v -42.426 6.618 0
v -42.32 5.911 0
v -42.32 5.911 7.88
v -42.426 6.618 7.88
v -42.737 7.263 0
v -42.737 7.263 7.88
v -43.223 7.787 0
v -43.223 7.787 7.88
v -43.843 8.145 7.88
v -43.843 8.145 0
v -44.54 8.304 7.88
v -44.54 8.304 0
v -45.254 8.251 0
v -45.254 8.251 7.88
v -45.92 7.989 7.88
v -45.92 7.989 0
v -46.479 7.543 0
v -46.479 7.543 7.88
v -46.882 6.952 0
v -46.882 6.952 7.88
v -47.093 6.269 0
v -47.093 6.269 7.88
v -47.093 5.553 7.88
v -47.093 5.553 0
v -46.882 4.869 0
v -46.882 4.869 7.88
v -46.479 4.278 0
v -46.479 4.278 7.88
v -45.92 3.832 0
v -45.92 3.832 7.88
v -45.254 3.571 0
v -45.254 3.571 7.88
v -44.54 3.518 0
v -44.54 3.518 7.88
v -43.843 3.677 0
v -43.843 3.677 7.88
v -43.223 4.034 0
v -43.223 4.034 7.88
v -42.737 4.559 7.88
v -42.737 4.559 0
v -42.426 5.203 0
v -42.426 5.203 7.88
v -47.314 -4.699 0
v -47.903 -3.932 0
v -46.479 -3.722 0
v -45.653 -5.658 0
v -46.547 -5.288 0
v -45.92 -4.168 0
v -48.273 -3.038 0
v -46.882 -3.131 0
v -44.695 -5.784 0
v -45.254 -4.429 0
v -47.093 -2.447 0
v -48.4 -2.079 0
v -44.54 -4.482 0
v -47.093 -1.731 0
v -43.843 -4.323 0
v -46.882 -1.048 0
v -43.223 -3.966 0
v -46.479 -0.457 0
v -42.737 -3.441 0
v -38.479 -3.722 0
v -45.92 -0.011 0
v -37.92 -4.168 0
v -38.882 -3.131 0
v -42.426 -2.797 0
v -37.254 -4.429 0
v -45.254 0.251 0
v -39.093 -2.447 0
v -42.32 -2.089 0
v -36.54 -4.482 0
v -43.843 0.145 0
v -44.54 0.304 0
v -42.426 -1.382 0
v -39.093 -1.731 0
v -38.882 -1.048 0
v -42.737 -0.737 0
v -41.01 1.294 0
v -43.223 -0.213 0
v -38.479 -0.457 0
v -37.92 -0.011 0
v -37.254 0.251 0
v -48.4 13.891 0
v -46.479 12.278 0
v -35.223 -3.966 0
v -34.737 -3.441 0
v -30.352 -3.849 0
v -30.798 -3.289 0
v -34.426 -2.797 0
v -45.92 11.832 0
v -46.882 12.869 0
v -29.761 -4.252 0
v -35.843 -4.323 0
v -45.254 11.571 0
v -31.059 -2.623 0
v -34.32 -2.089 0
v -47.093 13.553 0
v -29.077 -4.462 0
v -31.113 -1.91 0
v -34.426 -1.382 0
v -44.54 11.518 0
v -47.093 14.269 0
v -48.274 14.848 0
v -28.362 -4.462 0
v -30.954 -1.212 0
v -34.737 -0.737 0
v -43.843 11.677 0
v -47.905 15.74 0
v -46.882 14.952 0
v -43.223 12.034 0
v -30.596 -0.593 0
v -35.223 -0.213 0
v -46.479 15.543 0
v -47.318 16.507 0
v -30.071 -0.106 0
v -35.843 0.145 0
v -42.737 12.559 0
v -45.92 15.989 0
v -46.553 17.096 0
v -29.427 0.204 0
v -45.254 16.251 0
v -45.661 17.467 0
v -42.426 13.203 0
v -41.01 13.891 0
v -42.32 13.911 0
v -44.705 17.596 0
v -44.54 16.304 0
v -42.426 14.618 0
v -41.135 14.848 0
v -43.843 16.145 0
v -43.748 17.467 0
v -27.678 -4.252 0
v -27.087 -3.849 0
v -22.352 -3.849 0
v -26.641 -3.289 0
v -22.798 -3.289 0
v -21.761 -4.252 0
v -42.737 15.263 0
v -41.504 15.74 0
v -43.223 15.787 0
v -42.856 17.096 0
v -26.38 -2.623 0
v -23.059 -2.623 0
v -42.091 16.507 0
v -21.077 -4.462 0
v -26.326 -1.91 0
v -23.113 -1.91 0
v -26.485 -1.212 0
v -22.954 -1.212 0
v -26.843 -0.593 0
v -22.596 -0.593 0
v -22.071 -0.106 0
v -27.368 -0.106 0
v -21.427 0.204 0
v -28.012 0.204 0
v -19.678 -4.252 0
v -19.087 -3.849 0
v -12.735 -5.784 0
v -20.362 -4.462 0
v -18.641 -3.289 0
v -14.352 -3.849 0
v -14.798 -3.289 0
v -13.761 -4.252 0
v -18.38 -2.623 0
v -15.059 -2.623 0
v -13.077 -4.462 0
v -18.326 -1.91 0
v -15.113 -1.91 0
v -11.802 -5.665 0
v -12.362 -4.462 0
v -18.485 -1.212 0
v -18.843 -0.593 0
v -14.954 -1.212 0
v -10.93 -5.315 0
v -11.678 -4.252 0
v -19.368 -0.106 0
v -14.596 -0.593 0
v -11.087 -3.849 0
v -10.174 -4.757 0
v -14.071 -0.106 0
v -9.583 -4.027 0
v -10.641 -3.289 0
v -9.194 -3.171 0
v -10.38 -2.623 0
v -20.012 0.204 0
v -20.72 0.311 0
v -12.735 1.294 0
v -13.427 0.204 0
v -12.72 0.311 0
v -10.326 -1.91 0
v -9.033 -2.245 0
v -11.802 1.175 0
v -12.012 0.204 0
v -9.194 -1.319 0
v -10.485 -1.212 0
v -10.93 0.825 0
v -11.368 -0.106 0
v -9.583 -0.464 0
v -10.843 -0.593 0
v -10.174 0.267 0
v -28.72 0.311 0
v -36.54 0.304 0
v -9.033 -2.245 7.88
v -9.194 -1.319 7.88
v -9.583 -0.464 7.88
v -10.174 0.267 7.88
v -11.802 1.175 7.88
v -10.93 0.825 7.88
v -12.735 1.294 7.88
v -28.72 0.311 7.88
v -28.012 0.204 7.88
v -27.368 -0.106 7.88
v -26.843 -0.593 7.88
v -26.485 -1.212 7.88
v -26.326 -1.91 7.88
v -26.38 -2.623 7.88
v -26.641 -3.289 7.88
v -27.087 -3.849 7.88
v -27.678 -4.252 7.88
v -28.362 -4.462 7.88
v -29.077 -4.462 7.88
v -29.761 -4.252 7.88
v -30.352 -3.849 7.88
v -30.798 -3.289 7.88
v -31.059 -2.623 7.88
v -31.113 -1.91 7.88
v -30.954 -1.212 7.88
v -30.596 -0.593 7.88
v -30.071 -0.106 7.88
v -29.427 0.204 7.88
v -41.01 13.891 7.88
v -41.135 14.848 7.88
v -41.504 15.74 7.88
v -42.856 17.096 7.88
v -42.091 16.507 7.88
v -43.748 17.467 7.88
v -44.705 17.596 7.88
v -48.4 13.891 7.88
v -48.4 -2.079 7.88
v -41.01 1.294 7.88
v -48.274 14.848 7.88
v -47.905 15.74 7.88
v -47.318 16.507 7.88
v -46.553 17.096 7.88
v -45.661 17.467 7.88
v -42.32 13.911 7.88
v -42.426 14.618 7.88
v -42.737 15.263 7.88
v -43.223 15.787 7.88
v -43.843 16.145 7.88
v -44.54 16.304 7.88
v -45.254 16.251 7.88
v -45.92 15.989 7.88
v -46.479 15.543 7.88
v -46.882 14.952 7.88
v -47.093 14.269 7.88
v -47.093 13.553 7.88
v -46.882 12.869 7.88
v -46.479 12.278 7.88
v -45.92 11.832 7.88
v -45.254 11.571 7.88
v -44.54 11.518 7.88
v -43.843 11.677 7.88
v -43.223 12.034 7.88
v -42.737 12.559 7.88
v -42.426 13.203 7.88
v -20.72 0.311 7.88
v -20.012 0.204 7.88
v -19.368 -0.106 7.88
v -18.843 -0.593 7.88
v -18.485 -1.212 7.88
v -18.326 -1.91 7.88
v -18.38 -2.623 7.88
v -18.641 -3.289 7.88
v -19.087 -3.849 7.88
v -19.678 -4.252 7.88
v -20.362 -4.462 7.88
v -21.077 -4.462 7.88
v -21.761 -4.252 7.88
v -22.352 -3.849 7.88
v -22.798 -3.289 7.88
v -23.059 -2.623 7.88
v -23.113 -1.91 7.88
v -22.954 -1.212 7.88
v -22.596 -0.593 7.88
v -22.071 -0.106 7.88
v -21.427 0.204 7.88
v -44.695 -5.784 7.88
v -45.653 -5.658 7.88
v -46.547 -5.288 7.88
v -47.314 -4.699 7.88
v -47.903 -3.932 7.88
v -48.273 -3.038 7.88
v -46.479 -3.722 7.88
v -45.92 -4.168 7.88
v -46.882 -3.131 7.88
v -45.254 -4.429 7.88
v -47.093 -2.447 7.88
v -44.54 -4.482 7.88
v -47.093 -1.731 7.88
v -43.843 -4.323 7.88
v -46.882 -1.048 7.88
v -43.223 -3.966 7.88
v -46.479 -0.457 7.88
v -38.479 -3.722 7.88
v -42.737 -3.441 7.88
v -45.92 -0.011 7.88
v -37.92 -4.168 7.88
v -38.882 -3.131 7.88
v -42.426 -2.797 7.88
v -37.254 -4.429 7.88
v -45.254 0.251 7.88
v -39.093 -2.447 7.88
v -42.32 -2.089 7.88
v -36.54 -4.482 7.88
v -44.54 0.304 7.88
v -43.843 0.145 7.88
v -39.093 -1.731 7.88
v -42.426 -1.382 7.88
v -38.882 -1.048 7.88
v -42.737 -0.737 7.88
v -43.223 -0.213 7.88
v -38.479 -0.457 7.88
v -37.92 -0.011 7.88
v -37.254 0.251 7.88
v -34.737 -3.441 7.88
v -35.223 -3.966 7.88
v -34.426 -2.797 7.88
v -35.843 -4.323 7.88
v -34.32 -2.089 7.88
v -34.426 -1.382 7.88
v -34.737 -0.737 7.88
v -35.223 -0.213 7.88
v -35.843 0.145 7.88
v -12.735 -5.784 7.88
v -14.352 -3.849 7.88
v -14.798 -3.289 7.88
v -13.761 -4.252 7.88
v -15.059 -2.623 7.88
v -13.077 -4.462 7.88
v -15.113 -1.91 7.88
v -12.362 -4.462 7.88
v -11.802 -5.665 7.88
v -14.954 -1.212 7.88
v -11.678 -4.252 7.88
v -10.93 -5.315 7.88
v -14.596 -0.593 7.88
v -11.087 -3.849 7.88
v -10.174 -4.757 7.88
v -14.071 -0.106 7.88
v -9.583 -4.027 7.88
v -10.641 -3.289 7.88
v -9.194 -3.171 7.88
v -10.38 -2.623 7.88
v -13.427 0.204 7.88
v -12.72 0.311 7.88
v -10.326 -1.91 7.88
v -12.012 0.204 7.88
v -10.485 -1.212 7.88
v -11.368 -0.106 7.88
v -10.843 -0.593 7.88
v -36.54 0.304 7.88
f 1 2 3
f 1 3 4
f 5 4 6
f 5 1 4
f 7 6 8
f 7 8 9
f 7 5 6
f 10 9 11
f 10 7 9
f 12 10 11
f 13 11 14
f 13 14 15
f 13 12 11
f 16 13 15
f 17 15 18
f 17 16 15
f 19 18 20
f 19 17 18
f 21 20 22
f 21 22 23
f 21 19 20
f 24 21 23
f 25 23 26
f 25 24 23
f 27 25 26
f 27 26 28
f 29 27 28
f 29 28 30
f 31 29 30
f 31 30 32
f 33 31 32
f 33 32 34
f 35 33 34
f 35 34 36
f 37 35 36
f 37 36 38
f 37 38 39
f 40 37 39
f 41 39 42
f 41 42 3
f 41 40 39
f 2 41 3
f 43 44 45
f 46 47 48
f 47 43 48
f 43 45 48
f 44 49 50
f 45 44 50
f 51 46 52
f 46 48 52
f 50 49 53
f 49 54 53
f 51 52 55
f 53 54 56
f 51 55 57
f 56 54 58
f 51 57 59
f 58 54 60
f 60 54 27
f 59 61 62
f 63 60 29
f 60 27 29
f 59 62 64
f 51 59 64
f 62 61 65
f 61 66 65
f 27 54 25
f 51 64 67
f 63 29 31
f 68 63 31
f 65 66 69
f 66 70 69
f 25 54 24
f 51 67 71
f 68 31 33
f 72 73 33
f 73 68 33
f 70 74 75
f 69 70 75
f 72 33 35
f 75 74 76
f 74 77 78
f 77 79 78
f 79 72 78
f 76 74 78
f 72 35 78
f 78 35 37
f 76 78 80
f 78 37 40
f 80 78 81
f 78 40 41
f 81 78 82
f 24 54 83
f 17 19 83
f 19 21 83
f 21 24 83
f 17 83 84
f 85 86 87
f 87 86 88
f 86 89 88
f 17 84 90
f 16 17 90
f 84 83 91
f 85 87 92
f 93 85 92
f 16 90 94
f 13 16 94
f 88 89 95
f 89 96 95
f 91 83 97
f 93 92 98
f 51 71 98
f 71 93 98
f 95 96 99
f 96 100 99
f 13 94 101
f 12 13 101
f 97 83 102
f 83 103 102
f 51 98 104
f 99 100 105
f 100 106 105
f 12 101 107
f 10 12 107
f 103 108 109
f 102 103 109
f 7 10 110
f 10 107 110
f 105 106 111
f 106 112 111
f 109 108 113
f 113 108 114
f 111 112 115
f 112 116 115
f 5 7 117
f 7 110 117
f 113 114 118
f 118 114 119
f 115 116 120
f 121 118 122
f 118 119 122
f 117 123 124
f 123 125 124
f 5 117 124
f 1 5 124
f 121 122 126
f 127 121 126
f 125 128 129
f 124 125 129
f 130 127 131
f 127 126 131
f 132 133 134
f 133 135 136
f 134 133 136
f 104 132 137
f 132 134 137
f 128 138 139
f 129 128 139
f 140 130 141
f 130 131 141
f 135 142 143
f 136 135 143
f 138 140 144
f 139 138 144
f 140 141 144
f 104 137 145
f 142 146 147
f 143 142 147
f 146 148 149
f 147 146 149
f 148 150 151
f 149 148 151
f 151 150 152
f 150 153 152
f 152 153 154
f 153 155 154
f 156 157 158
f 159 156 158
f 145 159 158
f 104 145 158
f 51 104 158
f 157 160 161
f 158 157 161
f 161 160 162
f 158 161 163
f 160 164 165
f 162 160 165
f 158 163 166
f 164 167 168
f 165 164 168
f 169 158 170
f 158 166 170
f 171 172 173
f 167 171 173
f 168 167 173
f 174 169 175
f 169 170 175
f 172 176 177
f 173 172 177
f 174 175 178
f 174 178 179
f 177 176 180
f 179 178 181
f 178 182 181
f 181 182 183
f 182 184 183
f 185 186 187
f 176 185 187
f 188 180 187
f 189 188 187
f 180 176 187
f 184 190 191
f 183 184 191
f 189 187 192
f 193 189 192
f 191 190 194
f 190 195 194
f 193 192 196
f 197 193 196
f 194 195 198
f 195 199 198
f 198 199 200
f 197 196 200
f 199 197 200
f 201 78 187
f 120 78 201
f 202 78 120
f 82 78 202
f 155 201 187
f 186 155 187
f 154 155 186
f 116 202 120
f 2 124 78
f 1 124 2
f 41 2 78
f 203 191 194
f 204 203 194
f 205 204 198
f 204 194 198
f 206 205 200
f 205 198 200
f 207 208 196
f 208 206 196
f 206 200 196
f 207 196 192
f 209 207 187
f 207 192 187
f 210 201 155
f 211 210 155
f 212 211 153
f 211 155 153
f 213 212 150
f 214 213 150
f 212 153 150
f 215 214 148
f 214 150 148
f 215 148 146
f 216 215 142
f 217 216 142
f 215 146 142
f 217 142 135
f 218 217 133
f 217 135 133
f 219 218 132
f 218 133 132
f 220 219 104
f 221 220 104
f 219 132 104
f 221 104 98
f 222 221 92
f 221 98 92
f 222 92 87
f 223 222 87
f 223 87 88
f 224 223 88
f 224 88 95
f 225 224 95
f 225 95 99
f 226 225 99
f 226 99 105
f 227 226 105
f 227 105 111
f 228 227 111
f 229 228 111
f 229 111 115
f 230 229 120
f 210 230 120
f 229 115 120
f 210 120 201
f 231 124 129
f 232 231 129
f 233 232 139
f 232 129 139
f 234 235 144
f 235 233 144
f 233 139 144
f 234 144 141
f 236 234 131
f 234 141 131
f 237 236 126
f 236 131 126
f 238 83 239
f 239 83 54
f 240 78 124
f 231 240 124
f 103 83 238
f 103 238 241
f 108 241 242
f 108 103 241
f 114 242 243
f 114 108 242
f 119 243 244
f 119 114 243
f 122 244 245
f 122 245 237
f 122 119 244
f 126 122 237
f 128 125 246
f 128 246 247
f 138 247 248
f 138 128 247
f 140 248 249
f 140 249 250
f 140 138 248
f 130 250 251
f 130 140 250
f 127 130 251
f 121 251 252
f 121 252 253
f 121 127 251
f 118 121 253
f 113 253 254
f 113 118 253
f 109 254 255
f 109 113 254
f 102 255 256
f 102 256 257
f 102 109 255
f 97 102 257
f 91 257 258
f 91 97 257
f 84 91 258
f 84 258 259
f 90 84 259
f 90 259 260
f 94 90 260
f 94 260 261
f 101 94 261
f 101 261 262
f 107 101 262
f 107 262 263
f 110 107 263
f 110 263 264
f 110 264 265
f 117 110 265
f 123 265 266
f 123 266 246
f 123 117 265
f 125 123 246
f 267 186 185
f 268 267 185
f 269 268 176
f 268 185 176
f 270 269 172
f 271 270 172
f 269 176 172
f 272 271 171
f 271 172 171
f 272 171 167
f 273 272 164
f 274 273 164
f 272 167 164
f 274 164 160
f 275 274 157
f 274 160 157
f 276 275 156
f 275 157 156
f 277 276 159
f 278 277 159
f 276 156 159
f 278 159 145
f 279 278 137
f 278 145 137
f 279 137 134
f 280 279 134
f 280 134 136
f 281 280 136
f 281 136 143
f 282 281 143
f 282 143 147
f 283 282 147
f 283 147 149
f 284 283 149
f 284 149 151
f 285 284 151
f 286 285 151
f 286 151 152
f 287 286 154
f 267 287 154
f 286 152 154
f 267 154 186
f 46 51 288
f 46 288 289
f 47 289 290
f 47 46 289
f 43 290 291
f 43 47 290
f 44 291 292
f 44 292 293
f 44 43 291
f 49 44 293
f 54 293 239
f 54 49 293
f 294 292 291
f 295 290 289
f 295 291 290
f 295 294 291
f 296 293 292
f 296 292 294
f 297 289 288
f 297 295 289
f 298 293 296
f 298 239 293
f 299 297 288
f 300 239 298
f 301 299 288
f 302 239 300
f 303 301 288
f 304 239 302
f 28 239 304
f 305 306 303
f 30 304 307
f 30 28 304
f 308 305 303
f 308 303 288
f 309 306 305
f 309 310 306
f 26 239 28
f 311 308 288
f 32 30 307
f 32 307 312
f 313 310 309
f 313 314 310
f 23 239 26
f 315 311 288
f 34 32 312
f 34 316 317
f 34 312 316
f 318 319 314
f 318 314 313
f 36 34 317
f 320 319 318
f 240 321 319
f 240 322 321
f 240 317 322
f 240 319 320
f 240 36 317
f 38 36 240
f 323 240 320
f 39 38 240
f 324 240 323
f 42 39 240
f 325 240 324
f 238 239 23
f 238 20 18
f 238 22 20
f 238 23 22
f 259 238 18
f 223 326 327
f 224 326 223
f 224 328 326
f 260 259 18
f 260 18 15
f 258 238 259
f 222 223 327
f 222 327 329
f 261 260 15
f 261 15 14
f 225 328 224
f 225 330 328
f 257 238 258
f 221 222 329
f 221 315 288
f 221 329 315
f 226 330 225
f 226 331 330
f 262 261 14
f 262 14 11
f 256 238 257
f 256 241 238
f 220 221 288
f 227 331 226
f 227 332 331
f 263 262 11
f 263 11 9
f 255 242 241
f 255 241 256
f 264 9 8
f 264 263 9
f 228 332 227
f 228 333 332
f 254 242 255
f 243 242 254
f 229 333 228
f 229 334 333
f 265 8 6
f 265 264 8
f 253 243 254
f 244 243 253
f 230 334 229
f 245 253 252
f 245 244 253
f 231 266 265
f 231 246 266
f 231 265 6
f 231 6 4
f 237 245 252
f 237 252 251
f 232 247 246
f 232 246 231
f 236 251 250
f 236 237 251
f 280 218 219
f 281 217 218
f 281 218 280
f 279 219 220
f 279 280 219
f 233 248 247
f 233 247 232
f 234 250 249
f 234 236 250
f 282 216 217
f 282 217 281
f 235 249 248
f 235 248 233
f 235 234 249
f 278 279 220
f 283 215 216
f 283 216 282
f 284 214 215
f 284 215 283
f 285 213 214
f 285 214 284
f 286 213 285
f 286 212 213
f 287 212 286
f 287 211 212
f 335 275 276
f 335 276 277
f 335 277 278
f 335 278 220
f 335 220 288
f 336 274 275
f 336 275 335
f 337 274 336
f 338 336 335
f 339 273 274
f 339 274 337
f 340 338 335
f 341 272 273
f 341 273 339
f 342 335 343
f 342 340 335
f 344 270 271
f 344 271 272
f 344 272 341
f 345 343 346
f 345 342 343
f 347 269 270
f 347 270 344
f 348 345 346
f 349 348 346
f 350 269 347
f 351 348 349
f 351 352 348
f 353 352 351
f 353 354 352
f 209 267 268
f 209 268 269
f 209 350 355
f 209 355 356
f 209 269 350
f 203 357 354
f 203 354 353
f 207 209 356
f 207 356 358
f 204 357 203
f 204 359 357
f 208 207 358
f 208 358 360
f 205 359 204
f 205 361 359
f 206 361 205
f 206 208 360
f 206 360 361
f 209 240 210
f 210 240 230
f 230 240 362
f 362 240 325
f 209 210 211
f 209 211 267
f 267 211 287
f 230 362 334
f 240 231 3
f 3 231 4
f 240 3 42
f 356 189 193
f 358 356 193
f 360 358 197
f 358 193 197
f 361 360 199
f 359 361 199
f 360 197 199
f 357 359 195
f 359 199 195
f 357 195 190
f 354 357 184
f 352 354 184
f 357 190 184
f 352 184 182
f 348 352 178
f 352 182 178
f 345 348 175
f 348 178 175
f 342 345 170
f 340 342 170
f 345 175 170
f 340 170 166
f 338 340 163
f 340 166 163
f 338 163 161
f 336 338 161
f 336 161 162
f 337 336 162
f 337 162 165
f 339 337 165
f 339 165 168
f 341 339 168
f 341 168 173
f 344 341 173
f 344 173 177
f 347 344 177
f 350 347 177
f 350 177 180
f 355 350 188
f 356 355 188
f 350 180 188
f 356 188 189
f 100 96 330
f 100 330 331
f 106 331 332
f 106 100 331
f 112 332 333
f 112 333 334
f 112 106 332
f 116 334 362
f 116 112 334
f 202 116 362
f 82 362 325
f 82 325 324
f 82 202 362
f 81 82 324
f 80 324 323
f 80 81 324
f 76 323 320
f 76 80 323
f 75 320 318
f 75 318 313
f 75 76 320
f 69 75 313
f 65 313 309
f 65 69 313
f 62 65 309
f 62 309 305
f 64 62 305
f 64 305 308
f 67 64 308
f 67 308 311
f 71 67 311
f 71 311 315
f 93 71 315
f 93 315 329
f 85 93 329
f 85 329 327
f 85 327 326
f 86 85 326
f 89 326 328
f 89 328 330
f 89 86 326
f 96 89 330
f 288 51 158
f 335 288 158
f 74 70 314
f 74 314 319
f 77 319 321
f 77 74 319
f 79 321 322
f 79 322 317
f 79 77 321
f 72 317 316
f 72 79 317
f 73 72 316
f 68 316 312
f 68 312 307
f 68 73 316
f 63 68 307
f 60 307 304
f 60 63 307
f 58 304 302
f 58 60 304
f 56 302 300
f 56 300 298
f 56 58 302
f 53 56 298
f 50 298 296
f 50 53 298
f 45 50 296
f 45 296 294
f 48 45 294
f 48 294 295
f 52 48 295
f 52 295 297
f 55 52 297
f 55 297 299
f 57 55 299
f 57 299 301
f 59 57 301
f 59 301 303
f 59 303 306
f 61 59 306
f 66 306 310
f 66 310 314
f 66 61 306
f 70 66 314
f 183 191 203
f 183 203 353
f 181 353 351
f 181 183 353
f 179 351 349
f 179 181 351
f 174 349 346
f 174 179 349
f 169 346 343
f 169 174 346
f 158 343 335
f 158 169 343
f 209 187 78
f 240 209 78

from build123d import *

# Parameters (mm, degrees)
F0_R        = 2.4
F1_DEPTH    = 7.88
F2_T1_DEPTH = 26.405


# Not quite as in the source:
# - a fillet or chamfer that OpenCascade refuses, or shapes differently, is made with other operations: its cross-section is extruded or revolved along the edge and cut away or added


with BuildPart() as f1:
    # F0 (on Top) → F1 (new body)
    with BuildSketch(Plane.XY):
        Polygon((-48.3995083171, -5.7841986276), (-31.3221290569, -5.7841986276), (-9.0295083171, -5.7841986276), (-9.0295083171, 1.2940158032), (-41.0095083171, 1.2940158032), (-41.0095083171, 17.5958013724), (-48.3995083171, 17.5958013724), align=None)
        with Locations((-44.7195083171, -2.0891986276)):
            Circle(F0_R, mode=Mode.SUBTRACT)
        with Locations((-36.7195083171, -2.0891986276)):
            Circle(F0_R, mode=Mode.SUBTRACT)
        with BuildLine():
            ThreePointArc((-28.7195083171, -4.4891986276), (-31.1195083171, -2.0891986276), (-28.7195083171, 0.3108013724))
            ThreePointArc((-28.7195083171, 0.3108013724), (-26.3195083171, -2.0891986276), (-28.7195083171, -4.4891986276))
        make_face(mode=Mode.SUBTRACT)
        with BuildLine():
            ThreePointArc((-20.7195083171, -4.4891986276), (-23.1195083171, -2.0891986276), (-20.7195083171, 0.3108013724))
            ThreePointArc((-20.7195083171, 0.3108013724), (-18.3195083171, -2.0891986276), (-20.7195083171, -4.4891986276))
        make_face(mode=Mode.SUBTRACT)
        with BuildLine():
            ThreePointArc((-12.7195083171, -4.4891986276), (-15.1195083171, -2.0891986276), (-12.7195083171, 0.3108013724))
            ThreePointArc((-12.7195083171, 0.3108013724), (-10.3195083171, -2.0891986276), (-12.7195083171, -4.4891986276))
        make_face(mode=Mode.SUBTRACT)
        with Locations((-44.7195083171, 5.9108013724)):
            Circle(F0_R, mode=Mode.SUBTRACT)
        with Locations((-44.7195083171, 13.9108013724)):
            Circle(F0_R, mode=Mode.SUBTRACT)
    extrude(amount=F1_DEPTH)

    # F2: fillet of radius 3.705 on 5 edges, made by hand

    # F2_s2 → F2_t1 (cut)
    with BuildSketch(Plane.XY.offset(-9.2625)):
        with BuildLine():
            ThreePointArc((-48.3995083171, 13.8908013724), (-47.3143389413, 16.5106319967), (-44.6945083171, 17.5958013724))
            Line((-44.6945083171, 17.5958013724), (-48.3995083171, 17.5958013724))
            Line((-48.3995083171, 17.5958013724), (-48.3995083171, 13.8908013724))
        make_face()
        with BuildLine():
            ThreePointArc((-41.0095083171, 13.8908013724), (-42.0946776928, 16.5106319967), (-44.7145083171, 17.5958013724))
            Line((-44.7145083171, 17.5958013724), (-41.0095083171, 17.5958013724))
            Line((-41.0095083171, 17.5958013724), (-41.0095083171, 13.8908013724))
        make_face()
        with BuildLine():
            ThreePointArc((-9.0295083171, -2.4109841968), (-10.1146776928, 0.2088464274), (-12.7345083171, 1.2940158032))
            Line((-12.7345083171, 1.2940158032), (-9.0295083171, 1.2940158032))
            Line((-9.0295083171, 1.2940158032), (-9.0295083171, -2.4109841968))
        make_face()
        with BuildLine():
            ThreePointArc((-9.0295083171, -2.0791986276), (-10.1146776928, -4.6990292519), (-12.7345083171, -5.7841986276))
            Line((-12.7345083171, -5.7841986276), (-9.0295083171, -5.7841986276))
            Line((-9.0295083171, -5.7841986276), (-9.0295083171, -2.0791986276))
        make_face()
        with BuildLine():
            ThreePointArc((-44.6945083171, -5.7841986276), (-47.3143389413, -4.6990292519), (-48.3995083171, -2.0791986276))
            Line((-48.3995083171, -2.0791986276), (-48.3995083171, -5.7841986276))
            Line((-48.3995083171, -5.7841986276), (-44.6945083171, -5.7841986276))
        make_face()
    extrude(amount=F2_T1_DEPTH, mode=Mode.SUBTRACT)


solid = f1.part
